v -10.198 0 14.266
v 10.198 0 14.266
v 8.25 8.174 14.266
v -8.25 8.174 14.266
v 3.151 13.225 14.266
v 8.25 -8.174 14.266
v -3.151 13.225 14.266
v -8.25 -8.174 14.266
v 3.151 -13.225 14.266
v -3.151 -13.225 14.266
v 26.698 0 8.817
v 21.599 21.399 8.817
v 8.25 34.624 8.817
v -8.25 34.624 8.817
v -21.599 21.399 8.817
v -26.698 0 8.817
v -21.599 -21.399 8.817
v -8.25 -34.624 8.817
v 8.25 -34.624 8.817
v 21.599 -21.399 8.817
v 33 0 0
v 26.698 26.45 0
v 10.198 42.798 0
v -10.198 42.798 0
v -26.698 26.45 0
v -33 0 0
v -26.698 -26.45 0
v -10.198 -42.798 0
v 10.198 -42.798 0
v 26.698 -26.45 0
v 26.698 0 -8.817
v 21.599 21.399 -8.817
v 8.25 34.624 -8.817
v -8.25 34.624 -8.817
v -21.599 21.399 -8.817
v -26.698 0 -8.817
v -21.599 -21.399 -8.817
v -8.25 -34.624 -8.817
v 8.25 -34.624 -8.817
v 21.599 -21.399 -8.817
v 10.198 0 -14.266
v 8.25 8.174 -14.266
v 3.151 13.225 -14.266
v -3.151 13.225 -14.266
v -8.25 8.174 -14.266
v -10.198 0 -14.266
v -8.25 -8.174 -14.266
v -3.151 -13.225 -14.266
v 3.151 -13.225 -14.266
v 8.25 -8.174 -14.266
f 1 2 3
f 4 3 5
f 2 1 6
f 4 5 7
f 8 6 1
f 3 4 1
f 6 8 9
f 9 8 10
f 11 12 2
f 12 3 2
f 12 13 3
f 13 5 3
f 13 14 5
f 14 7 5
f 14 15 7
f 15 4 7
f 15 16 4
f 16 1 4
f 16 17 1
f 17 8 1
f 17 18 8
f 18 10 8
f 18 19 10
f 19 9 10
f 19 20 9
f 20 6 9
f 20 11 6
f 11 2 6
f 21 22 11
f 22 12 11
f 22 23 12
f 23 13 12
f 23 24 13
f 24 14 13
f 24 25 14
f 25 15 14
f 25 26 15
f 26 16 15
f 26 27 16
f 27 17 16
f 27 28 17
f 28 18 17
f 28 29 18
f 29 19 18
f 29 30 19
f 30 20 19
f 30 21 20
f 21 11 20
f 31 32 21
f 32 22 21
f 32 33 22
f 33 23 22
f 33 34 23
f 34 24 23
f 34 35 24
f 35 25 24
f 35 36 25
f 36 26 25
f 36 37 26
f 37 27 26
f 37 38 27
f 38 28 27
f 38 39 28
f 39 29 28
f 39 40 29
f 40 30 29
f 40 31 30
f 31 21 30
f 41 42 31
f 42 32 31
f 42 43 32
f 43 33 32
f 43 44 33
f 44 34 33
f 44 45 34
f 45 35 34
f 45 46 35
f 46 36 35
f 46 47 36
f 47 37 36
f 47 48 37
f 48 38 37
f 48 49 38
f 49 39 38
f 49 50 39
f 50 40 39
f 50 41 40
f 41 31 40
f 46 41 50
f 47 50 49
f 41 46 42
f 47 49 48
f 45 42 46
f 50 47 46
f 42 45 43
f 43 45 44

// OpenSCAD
// Generated by SolidPython 1.0.1 on 2020-07-29 00:46:50


scale(v = [11, 15, 5]) {
	sphere(r = 3);
}
/***********************************************
*********      SolidPython code:      **********
************************************************
 
# import packages: SolidPython
from solid import *
from solid.utils import *
from itertools import chain, combinations, permutations


class Resize:

    def __init__(self, scad_file):
        self.scad_file = scad_file
        #self.scad_file = import_scad(scad_file)
        # cone/cylinder param:
        self.r1 = 0
        self.r2 = 0
        self.h = 0
        # rectangular prism param:
        self.w = 0
        self.l = 0
        # ellipse param:
        self.r = 0

    # import OpenScad code (file name corresponds to shape)


    # classify shape + parameters
    def assign(self, param1, param2, param3):
        if self.scad_file == 'cone.scad':
            self.r1 = param1
            self.r2 = param2
            self.h = param3
        elif self.scad_file == 'cylinder.scad':
            self.r1 = param1
            self.r2 = param2
            self.h = param3
        elif self.scad_file == 'rectangularPrism.scad':
            self.h = param1
            self.l = param2
            self.w = param3
        else:
            self.r = param1
            self.h = param2

    # resize parameters
    def iterate(self):
        x = range(3, 20, 2)
        i = 1
        if self.scad_file == 'cone.scad':
            tempList = list(permutations(x, 2))
            for temp in tempList:
                param1 = temp[0]
                param2 = temp[1]
                filepath = 'produced_scad_files/' + 'cone' + str(param1) + '_' + str(param2) + '_' + '.scad'
                scad_render_to_file(cylinder(h=param1, r1=param2, r2=0), filepath)

        elif self.scad_file == 'cylinder.scad':
            tempList = list(permutations(x, 3))
            for temp in tempList:
                param1 = temp[0]
                param2 = temp[1]
                filepath = 'produced_scad_files/' + 'cylinder' + str(param1) + '_' + str(param2) + '_' + '.scad'
                scad_render_to_file(cylinder(h=param1, r1=param2, r2=param2), filepath)

        elif self.scad_file == 'rectangularPrism.scad':
            tempList = list(permutations(x, 3))
            for temp in tempList:
                param1 = temp[0]
                param2 = temp[1]
                param3 = temp[2]
                filepath = 'produced_scad_files/' + 'rectangularPrism' + str(param1) + '_' + str(param2) + '_' + str(
                    param3) + '.scad'
                scad_render_to_file(cube(size=(param1, param2, param3)), filepath)

        elif self.scad_file == 'ellipse.scad':
            tempList = list(permutations(x, 4))
            for temp in tempList:
                param1 = temp[0]
                param2 = temp[1]
                param3 = temp[2]
                param4 = temp[3]
                filepath = 'produced_scad_files/' + 'ellipse' + str(param1) + '_' + str(param2) + '_' + str(param3) + '_' + str(param4) + '.scad'
                scad_render_to_file(scale([param1, param2, param3])(sphere(r=param4)), filepath)

    def render_to_scadfile(self):
        scad_render_to_file(scad, 'example.scad') 
 
************************************************/
